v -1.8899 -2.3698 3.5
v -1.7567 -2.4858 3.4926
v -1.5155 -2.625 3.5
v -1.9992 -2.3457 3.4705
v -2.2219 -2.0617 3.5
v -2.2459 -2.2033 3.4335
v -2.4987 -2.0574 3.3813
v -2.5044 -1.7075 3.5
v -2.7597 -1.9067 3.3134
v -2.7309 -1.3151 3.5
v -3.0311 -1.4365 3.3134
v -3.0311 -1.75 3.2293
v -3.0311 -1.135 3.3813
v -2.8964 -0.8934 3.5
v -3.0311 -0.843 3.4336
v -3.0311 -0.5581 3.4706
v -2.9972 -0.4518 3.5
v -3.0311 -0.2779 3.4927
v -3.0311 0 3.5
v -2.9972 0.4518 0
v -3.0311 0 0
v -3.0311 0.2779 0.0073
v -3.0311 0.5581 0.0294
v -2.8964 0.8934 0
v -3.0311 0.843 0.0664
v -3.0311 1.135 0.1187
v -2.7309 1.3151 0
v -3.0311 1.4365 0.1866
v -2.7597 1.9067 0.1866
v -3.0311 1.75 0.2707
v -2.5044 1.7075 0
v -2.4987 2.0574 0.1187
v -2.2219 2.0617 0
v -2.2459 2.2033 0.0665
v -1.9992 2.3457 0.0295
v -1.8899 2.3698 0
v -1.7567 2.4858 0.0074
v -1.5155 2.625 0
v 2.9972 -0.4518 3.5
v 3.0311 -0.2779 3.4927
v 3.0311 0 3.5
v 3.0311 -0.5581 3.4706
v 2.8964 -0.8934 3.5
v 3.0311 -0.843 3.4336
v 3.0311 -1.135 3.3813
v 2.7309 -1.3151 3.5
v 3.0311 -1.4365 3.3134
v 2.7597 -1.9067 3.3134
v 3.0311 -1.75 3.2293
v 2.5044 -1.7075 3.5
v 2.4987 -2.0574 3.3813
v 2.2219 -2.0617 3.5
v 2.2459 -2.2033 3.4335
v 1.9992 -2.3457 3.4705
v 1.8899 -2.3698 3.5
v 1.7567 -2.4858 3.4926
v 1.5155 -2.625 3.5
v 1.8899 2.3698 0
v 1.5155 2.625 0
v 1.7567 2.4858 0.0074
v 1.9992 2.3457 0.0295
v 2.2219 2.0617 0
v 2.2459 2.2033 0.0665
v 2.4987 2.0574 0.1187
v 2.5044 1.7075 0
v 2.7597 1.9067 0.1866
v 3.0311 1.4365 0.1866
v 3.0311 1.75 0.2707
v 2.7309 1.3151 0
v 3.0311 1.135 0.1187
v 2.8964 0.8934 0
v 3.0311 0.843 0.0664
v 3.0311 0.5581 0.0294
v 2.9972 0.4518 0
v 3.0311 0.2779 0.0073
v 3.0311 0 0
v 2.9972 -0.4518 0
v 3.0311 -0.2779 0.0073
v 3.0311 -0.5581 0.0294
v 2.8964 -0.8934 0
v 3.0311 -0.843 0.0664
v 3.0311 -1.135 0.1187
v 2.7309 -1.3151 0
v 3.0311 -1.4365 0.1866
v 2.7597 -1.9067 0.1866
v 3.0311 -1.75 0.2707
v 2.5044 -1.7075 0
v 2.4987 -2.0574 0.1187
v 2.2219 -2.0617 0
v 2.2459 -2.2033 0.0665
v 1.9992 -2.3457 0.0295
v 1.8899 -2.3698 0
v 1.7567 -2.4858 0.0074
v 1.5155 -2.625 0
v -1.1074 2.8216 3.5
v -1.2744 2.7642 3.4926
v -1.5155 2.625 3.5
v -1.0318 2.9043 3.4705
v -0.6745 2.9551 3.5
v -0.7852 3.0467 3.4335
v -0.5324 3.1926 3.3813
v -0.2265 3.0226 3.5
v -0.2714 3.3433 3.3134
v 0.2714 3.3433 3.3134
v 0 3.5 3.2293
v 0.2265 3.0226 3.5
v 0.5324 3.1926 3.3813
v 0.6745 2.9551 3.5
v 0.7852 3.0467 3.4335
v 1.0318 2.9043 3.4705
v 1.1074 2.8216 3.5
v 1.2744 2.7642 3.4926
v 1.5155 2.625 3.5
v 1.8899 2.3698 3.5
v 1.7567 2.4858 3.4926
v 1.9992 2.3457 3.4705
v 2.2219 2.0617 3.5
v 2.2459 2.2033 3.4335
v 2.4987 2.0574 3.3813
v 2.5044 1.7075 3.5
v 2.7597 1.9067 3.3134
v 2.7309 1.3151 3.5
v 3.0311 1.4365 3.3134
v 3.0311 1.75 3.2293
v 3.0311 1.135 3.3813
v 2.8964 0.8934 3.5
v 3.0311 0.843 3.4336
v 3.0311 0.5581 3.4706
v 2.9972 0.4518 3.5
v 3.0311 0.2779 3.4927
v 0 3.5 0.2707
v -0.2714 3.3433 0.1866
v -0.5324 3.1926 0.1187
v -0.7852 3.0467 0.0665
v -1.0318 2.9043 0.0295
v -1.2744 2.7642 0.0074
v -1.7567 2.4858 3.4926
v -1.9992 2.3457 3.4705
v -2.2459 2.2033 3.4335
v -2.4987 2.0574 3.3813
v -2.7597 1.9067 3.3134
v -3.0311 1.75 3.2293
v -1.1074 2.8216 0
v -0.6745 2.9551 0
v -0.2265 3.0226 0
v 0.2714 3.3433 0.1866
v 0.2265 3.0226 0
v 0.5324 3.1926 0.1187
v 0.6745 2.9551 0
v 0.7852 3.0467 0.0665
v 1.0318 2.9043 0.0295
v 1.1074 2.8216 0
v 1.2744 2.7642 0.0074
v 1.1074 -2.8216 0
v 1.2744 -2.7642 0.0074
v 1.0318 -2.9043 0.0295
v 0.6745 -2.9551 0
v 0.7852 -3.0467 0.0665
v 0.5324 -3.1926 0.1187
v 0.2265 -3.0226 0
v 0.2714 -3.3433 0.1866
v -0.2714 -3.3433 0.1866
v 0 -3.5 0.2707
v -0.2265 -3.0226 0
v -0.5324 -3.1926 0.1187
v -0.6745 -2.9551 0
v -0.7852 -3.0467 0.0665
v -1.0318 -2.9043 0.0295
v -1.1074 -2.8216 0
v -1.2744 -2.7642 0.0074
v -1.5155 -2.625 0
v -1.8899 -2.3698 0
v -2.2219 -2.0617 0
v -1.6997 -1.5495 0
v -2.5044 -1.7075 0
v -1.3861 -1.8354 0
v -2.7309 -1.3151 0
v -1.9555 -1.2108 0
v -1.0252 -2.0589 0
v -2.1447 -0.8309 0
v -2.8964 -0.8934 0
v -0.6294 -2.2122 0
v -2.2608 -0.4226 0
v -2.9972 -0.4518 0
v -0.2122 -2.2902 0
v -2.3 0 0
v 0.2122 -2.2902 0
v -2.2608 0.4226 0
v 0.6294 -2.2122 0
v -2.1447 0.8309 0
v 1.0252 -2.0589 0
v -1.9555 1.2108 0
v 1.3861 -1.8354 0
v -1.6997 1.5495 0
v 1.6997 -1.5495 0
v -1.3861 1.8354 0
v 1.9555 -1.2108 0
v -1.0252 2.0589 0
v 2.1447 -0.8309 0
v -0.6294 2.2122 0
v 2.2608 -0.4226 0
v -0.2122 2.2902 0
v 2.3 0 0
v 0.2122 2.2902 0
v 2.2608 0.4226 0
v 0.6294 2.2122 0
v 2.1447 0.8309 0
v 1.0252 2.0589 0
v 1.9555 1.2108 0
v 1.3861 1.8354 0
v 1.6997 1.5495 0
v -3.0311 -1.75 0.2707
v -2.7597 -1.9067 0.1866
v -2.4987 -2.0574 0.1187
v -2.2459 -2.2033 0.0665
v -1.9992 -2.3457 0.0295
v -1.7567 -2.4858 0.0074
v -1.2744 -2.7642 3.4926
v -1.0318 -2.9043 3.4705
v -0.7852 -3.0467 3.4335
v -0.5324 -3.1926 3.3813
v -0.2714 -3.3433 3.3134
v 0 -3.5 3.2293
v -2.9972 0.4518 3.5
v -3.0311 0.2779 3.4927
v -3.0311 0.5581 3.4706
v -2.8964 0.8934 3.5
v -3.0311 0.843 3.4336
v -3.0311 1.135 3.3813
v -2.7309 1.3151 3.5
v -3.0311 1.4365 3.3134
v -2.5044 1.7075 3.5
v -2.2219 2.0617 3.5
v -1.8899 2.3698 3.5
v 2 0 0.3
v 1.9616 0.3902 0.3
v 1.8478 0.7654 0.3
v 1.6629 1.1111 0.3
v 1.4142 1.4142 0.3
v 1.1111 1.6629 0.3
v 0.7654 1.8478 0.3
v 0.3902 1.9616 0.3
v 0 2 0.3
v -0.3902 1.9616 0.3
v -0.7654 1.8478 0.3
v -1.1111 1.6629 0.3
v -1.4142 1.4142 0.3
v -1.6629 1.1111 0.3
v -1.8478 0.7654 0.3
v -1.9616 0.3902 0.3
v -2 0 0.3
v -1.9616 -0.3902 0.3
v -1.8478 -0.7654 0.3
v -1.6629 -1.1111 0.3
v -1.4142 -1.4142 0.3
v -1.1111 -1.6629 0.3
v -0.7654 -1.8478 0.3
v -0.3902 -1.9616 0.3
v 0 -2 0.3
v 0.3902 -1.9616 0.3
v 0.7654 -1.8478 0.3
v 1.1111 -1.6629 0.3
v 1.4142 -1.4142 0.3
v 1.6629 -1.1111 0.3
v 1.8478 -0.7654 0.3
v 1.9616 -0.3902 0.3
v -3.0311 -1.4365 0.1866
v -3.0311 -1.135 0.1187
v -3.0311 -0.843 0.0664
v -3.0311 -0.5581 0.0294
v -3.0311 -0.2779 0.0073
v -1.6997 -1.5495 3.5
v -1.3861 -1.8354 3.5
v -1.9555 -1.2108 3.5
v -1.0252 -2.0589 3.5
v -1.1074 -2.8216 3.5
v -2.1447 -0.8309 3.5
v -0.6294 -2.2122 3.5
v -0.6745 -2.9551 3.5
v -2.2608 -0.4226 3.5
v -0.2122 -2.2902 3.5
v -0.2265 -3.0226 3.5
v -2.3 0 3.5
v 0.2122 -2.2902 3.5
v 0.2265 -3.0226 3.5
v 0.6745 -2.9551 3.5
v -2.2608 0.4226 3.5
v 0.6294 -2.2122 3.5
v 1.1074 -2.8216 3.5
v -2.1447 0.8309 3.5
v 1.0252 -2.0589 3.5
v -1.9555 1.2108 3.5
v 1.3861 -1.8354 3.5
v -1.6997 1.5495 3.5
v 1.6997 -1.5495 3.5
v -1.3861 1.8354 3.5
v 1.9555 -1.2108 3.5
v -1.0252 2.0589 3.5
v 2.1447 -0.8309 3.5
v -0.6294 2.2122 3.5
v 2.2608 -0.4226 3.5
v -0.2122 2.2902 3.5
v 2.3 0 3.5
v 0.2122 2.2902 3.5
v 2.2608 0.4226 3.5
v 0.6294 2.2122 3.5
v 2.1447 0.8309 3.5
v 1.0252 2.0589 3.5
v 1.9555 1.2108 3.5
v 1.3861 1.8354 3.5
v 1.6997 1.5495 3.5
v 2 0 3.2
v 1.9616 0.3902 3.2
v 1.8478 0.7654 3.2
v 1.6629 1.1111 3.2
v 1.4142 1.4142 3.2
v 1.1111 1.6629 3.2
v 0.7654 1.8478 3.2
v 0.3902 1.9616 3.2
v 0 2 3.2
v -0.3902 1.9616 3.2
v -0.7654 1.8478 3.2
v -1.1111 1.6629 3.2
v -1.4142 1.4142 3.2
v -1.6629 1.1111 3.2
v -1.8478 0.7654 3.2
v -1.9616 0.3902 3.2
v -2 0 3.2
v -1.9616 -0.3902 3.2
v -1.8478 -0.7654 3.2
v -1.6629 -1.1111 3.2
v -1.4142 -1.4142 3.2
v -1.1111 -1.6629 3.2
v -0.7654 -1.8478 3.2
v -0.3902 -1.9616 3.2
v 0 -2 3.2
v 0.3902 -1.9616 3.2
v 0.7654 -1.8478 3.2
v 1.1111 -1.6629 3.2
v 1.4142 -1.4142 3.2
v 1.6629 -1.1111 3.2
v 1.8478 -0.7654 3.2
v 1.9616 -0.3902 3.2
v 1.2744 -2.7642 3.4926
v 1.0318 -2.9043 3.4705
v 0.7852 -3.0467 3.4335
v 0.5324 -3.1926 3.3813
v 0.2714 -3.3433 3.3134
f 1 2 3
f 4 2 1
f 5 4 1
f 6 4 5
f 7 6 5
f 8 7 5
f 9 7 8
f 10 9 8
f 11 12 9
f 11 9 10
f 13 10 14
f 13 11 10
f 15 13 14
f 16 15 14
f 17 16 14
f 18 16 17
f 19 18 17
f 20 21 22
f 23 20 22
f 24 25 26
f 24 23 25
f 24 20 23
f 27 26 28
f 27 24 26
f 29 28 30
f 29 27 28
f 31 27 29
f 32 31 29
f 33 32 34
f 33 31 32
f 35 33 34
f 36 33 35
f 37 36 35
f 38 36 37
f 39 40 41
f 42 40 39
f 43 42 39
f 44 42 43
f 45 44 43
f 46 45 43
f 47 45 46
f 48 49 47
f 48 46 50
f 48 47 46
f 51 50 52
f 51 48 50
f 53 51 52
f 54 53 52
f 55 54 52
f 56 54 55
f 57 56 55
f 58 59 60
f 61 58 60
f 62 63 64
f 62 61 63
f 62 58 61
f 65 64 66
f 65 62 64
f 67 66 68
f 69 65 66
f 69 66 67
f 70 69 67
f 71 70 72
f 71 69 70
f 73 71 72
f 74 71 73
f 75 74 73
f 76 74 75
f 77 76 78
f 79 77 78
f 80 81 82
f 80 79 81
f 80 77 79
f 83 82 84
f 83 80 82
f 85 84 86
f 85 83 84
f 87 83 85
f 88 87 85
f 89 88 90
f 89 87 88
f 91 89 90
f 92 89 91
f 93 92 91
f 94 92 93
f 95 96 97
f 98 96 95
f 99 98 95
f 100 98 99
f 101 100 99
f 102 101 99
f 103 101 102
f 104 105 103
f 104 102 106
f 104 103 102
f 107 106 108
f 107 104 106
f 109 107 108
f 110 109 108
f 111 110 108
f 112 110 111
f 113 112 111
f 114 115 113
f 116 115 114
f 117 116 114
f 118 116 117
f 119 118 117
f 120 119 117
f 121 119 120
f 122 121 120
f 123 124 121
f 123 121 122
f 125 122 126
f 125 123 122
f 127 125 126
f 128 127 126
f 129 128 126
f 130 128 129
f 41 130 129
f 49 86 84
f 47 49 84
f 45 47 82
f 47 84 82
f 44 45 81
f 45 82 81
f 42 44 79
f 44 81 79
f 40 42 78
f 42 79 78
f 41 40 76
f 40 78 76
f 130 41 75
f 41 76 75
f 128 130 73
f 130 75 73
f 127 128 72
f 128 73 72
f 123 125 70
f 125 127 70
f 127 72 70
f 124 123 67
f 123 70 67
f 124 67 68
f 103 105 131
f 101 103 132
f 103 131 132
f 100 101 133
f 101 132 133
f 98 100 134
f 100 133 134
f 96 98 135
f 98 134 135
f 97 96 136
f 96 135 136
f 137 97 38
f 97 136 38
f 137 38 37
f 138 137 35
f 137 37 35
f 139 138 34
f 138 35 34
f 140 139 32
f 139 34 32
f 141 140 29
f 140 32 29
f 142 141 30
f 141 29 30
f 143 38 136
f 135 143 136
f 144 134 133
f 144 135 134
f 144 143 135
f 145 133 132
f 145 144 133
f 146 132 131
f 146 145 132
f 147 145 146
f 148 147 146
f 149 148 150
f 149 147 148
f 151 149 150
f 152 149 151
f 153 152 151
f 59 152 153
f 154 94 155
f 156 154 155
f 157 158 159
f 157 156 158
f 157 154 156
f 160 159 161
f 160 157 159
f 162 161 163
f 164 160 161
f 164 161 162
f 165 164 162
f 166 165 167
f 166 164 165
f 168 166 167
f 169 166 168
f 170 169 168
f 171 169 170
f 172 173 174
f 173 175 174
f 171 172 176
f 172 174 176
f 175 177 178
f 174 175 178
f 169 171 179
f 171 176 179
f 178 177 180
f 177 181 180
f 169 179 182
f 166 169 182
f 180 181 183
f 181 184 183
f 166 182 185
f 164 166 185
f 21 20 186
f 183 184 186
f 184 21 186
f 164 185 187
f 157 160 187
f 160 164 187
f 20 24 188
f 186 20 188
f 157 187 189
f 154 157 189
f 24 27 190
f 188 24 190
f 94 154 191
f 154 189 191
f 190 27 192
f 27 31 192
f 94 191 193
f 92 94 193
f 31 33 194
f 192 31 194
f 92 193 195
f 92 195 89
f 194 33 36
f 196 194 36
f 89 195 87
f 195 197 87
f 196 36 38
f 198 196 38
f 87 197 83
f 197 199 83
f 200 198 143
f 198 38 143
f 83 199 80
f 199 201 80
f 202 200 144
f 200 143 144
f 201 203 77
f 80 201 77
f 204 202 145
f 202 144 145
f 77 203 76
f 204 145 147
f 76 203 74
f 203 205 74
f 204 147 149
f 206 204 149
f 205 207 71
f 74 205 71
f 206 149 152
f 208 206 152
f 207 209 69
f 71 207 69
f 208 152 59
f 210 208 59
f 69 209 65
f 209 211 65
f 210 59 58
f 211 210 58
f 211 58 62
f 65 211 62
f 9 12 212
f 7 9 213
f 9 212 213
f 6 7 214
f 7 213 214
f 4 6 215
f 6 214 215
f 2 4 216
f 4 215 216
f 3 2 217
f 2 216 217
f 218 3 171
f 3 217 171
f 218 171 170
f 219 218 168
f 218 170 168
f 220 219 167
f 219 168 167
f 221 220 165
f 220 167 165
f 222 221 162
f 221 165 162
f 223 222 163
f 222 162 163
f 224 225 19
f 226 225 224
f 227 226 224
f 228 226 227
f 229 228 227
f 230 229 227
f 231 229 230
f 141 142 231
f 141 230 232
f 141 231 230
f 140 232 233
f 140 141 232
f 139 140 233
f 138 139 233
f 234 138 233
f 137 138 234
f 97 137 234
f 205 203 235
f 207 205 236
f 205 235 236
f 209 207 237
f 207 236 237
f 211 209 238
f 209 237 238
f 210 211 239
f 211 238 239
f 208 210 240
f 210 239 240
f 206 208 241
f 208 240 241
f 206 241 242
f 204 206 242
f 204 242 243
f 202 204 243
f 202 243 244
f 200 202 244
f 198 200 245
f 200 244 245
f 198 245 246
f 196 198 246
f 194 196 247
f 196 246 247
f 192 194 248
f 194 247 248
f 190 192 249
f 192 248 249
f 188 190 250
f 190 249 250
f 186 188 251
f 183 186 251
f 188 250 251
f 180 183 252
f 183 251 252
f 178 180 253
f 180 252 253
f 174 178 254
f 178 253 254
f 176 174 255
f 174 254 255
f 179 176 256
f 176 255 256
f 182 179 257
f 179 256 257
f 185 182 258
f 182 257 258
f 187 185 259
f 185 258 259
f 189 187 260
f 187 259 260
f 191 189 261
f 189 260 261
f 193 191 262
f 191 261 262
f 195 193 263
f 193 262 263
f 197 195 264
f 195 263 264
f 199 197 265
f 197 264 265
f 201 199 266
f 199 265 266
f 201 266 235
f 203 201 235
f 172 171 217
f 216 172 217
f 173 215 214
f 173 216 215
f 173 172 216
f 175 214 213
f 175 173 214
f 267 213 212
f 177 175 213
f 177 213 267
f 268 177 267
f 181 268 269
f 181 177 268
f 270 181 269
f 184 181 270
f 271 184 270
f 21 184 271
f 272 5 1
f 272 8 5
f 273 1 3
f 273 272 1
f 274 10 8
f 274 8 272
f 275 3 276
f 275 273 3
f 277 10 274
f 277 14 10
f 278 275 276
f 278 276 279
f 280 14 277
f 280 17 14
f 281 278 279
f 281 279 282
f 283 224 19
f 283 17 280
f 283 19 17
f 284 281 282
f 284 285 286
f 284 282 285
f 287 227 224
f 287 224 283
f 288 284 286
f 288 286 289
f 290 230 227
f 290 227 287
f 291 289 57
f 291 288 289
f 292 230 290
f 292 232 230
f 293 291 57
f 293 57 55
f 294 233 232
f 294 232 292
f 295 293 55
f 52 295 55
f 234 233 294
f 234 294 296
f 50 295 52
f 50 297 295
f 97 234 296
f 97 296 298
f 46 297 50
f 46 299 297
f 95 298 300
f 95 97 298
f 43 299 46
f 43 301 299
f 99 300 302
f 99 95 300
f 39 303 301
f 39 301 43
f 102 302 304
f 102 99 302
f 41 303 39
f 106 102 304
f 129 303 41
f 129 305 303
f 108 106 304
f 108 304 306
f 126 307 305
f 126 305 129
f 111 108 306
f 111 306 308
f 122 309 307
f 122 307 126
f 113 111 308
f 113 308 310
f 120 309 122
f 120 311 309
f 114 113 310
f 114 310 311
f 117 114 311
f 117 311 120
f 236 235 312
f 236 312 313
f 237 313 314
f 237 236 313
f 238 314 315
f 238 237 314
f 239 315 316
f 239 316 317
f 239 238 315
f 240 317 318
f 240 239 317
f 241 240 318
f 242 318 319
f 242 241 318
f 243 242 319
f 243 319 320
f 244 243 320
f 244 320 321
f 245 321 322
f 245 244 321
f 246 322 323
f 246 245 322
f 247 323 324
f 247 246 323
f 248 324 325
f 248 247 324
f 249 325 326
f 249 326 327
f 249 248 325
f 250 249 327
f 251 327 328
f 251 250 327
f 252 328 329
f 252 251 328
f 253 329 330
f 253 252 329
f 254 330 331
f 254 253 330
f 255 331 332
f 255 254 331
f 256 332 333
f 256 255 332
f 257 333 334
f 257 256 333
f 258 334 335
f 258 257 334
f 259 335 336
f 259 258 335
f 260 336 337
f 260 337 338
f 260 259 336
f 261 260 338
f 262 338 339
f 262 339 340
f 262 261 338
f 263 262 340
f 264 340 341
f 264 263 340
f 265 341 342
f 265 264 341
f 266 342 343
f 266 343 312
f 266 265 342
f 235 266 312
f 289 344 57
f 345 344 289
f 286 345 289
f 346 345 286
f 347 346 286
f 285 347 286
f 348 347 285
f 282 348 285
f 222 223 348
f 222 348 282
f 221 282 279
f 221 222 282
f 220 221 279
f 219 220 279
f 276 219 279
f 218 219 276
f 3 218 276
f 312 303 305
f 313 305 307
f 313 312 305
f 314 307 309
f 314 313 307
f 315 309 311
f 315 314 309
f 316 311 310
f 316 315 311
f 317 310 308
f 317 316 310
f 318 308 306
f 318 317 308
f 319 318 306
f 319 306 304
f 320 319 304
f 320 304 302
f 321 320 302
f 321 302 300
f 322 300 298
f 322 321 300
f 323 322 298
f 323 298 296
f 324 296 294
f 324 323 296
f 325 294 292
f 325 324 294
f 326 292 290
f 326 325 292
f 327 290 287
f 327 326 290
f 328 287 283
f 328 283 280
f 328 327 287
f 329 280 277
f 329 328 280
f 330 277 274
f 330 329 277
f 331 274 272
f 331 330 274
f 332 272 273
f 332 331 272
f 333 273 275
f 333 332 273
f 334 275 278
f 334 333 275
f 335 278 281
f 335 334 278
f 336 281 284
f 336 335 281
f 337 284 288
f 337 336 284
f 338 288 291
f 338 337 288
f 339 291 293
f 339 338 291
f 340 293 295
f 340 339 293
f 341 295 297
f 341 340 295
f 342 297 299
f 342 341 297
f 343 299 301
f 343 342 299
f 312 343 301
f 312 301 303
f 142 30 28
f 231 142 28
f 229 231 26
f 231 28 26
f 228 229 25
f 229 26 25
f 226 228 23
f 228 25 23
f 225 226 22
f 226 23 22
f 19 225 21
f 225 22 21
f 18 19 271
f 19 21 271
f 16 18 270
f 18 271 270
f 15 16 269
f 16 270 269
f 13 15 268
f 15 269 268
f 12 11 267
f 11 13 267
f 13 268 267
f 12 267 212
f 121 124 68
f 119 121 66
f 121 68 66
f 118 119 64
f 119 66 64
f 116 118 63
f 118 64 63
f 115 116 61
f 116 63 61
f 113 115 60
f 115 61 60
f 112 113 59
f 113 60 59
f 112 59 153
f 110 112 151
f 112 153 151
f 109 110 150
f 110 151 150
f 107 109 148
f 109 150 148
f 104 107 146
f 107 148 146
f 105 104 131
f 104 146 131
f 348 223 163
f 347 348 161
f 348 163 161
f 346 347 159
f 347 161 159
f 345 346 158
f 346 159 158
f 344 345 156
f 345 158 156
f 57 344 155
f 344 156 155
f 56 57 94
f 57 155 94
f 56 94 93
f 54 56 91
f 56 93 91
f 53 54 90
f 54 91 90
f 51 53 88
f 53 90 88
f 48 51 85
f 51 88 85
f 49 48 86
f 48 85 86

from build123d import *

# Parameters (mm, degrees)
F0_R     = 2
F1_DEPTH = 3.5
F4_SIZE  = 0.3


with BuildPart() as f1:
    # F0 (on Top) → F1 (new body)
    with BuildSketch(Plane.XY):
        Polygon((3.031089, 1.75), (0, 3.5), (-3.031089, 1.75), (-3.031089, -1.75), (0, -3.5), (3.031089, -1.75), align=None)
        Circle(F0_R, mode=Mode.SUBTRACT)
    extrude(amount=F1_DEPTH)

    # F2 (on Front) → F3 (revolve, cut)
    with BuildSketch(Plane.XZ):
        Polygon((3.031089, 3.5), (5.80237, 1.9), (5.80237, 3.5), align=None)
        Polygon((5.80237, 1.6), (3.031089, 0), (5.80237, 0), align=None)
    revolve(axis=Axis((0, 0, 1.75), (0, 0, -1)), mode=Mode.SUBTRACT)

    # F4
    f4_edges = [f1.edges().sort_by_distance(p)[0] for p in [
        (-2, 0, 3.5),
        (-2, 0, 0),
    ]]
    chamfer(f4_edges, length=F4_SIZE)


solid = f1.part
